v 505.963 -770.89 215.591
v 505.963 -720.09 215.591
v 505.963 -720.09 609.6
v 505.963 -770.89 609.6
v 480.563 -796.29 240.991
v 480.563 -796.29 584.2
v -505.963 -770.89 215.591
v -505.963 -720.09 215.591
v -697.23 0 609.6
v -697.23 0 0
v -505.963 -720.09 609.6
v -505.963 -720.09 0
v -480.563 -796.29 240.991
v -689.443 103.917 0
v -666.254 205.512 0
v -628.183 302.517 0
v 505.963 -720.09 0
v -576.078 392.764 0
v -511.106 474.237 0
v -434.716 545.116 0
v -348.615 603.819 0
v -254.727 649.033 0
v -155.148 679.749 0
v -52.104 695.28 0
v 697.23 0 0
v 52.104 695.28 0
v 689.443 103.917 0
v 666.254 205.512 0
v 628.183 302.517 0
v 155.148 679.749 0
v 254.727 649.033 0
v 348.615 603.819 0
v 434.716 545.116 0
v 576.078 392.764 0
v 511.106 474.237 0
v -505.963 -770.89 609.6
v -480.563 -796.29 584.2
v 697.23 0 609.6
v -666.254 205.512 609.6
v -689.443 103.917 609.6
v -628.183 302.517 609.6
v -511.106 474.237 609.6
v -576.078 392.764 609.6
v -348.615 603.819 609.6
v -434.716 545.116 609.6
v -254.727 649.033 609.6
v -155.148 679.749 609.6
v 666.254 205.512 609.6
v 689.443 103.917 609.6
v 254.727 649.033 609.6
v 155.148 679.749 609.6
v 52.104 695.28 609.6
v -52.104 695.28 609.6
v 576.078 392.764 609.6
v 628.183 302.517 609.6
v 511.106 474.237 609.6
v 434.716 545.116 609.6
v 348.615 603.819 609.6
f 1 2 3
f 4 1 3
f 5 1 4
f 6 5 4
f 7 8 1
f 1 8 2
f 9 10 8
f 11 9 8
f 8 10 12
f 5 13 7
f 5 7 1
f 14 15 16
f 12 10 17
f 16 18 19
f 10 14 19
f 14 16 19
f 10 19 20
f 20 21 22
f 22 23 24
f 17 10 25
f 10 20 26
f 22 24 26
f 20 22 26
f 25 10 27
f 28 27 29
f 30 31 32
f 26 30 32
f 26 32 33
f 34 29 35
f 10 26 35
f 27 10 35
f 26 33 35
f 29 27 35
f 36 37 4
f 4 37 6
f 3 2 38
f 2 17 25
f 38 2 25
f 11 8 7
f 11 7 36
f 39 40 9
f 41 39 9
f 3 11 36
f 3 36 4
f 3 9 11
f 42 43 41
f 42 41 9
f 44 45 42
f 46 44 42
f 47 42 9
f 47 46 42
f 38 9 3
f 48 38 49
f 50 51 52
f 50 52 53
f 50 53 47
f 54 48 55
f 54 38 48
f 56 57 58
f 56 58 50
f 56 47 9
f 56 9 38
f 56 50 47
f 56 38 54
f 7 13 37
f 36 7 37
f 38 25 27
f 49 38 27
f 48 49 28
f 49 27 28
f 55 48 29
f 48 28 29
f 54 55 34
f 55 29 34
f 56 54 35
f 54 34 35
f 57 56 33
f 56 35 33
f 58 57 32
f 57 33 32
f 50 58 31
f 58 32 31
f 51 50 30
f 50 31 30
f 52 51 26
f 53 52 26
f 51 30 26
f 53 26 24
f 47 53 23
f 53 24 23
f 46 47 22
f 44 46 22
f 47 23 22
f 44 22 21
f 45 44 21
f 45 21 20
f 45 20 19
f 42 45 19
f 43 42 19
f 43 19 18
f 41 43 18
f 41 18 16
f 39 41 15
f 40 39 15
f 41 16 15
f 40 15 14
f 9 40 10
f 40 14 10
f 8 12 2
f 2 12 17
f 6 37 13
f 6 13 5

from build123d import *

# Parameters (mm, degrees)
F1_DEPTH = 609.6
F2_W     = 1011.9250416756
F2_H     = 394.0085991383
F3_DEPTH = 76.2
F4_SIZE  = 25.4


with BuildPart() as f1:
    # F0 (on Top) → F1 (new body)
    with BuildSketch(Plane.XY):
        with BuildLine():
            Line((505.9625208378, -720.0900167227), (605.3317958883, -345.9813431194))
            ThreePointArc((605.3317958883, -345.9813431194), (0, -697.23), (-605.3317958883, -345.9813431194))
            Line((-605.3317958883, -345.9813431194), (-505.9625208378, -720.0900167227))
            Line((-505.9625208378, -720.0900167227), (505.9625208378, -720.0900167227))
        make_face()
        with BuildLine():
            Line((605.3317958883, -345.9813431194), (697.23, 0))
            ThreePointArc((697.23, 0), (0, 697.23), (-697.23, 0))
            Line((-697.23, 0), (-605.3317958883, -345.9813431194))
            ThreePointArc((-605.3317958883, -345.9813431194), (0, -697.23), (605.3317958883, -345.9813431194))
        make_face()
    extrude(amount=F1_DEPTH)

    # F2 (on face) → F3 (join)
    with BuildSketch(Plane.XZ.offset(720.0900167227)):
        with Locations((0, 412.5957004309)):
            Rectangle(F2_W, F2_H)
    extrude(amount=F3_DEPTH)

    # F4
    f4_edges = [f1.edges().sort_by_distance(p)[0] for p in [
        (0, -796.290017, 609.6),
        (505.962521, -796.290017, 412.5957),
        (0, -796.290017, 215.591401),
        (-505.962521, -796.290017, 412.5957),
    ]]
    chamfer(f4_edges, length=F4_SIZE)


solid = f1.part
